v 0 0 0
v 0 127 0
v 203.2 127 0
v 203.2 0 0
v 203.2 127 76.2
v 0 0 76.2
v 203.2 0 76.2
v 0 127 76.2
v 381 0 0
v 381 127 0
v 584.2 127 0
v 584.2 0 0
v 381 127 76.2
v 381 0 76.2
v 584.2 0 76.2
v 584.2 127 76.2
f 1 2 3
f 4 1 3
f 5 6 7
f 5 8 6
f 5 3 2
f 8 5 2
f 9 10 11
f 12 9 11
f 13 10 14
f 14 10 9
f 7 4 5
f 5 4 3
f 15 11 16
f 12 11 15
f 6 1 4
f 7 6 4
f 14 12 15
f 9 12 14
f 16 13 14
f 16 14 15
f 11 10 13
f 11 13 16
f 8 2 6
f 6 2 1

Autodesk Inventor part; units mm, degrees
ref_plane "YZ Plane" through (0, 0, 0) normal (1, 0, 0) x (0, 1, 0)
ref_plane "XZ Plane" through (0, 0, 0) normal (0, 1, 0) x (-1, 0, 0)
ref_plane "XY Plane" through (0, 0, 0) normal (0, 0, 1) x (1, 0, 0)
sketch "Sketch1" plane through (0, 0, 0) normal (0, 0, 1) x (1, 0, 0)
  line L0 (0, 0) -> (203.2, 0)
  line L1 (203.2, 0) -> (203.2, 127)
  line L2 (203.2, 127) -> (0, 127)
  line L3 (0, 127) -> (0, 0)
  line L4 (0, 127) -> (584.2, 127)
  line L5 (584.2, 127) -> (584.2, 0)
  line L6 (584.2, 0) -> (0, 0)
  line L7 (0, 0) -> (0, 127)
  line L8 (584.2, 127) -> (381, 127)
  line L9 (381, 127) -> (381, 0)
  line L10 (381, 0) -> (584.2, 0)
  line L11 (584.2, 0) -> (584.2, 127)
  dimension "d0" = 203.2
  dimension "d1" = 127
  dimension "d2" = 584.2
  dimension "d3" = 127
  dimension "d4" = 203.2
  dimension "d5" = 127
extrude "Extrusion1" add sketch "Sketch1" along normal blind 76.2 contours L3 L2 L1 L0 | L9 L4 L5 L6
properties part number "GapBumper"
